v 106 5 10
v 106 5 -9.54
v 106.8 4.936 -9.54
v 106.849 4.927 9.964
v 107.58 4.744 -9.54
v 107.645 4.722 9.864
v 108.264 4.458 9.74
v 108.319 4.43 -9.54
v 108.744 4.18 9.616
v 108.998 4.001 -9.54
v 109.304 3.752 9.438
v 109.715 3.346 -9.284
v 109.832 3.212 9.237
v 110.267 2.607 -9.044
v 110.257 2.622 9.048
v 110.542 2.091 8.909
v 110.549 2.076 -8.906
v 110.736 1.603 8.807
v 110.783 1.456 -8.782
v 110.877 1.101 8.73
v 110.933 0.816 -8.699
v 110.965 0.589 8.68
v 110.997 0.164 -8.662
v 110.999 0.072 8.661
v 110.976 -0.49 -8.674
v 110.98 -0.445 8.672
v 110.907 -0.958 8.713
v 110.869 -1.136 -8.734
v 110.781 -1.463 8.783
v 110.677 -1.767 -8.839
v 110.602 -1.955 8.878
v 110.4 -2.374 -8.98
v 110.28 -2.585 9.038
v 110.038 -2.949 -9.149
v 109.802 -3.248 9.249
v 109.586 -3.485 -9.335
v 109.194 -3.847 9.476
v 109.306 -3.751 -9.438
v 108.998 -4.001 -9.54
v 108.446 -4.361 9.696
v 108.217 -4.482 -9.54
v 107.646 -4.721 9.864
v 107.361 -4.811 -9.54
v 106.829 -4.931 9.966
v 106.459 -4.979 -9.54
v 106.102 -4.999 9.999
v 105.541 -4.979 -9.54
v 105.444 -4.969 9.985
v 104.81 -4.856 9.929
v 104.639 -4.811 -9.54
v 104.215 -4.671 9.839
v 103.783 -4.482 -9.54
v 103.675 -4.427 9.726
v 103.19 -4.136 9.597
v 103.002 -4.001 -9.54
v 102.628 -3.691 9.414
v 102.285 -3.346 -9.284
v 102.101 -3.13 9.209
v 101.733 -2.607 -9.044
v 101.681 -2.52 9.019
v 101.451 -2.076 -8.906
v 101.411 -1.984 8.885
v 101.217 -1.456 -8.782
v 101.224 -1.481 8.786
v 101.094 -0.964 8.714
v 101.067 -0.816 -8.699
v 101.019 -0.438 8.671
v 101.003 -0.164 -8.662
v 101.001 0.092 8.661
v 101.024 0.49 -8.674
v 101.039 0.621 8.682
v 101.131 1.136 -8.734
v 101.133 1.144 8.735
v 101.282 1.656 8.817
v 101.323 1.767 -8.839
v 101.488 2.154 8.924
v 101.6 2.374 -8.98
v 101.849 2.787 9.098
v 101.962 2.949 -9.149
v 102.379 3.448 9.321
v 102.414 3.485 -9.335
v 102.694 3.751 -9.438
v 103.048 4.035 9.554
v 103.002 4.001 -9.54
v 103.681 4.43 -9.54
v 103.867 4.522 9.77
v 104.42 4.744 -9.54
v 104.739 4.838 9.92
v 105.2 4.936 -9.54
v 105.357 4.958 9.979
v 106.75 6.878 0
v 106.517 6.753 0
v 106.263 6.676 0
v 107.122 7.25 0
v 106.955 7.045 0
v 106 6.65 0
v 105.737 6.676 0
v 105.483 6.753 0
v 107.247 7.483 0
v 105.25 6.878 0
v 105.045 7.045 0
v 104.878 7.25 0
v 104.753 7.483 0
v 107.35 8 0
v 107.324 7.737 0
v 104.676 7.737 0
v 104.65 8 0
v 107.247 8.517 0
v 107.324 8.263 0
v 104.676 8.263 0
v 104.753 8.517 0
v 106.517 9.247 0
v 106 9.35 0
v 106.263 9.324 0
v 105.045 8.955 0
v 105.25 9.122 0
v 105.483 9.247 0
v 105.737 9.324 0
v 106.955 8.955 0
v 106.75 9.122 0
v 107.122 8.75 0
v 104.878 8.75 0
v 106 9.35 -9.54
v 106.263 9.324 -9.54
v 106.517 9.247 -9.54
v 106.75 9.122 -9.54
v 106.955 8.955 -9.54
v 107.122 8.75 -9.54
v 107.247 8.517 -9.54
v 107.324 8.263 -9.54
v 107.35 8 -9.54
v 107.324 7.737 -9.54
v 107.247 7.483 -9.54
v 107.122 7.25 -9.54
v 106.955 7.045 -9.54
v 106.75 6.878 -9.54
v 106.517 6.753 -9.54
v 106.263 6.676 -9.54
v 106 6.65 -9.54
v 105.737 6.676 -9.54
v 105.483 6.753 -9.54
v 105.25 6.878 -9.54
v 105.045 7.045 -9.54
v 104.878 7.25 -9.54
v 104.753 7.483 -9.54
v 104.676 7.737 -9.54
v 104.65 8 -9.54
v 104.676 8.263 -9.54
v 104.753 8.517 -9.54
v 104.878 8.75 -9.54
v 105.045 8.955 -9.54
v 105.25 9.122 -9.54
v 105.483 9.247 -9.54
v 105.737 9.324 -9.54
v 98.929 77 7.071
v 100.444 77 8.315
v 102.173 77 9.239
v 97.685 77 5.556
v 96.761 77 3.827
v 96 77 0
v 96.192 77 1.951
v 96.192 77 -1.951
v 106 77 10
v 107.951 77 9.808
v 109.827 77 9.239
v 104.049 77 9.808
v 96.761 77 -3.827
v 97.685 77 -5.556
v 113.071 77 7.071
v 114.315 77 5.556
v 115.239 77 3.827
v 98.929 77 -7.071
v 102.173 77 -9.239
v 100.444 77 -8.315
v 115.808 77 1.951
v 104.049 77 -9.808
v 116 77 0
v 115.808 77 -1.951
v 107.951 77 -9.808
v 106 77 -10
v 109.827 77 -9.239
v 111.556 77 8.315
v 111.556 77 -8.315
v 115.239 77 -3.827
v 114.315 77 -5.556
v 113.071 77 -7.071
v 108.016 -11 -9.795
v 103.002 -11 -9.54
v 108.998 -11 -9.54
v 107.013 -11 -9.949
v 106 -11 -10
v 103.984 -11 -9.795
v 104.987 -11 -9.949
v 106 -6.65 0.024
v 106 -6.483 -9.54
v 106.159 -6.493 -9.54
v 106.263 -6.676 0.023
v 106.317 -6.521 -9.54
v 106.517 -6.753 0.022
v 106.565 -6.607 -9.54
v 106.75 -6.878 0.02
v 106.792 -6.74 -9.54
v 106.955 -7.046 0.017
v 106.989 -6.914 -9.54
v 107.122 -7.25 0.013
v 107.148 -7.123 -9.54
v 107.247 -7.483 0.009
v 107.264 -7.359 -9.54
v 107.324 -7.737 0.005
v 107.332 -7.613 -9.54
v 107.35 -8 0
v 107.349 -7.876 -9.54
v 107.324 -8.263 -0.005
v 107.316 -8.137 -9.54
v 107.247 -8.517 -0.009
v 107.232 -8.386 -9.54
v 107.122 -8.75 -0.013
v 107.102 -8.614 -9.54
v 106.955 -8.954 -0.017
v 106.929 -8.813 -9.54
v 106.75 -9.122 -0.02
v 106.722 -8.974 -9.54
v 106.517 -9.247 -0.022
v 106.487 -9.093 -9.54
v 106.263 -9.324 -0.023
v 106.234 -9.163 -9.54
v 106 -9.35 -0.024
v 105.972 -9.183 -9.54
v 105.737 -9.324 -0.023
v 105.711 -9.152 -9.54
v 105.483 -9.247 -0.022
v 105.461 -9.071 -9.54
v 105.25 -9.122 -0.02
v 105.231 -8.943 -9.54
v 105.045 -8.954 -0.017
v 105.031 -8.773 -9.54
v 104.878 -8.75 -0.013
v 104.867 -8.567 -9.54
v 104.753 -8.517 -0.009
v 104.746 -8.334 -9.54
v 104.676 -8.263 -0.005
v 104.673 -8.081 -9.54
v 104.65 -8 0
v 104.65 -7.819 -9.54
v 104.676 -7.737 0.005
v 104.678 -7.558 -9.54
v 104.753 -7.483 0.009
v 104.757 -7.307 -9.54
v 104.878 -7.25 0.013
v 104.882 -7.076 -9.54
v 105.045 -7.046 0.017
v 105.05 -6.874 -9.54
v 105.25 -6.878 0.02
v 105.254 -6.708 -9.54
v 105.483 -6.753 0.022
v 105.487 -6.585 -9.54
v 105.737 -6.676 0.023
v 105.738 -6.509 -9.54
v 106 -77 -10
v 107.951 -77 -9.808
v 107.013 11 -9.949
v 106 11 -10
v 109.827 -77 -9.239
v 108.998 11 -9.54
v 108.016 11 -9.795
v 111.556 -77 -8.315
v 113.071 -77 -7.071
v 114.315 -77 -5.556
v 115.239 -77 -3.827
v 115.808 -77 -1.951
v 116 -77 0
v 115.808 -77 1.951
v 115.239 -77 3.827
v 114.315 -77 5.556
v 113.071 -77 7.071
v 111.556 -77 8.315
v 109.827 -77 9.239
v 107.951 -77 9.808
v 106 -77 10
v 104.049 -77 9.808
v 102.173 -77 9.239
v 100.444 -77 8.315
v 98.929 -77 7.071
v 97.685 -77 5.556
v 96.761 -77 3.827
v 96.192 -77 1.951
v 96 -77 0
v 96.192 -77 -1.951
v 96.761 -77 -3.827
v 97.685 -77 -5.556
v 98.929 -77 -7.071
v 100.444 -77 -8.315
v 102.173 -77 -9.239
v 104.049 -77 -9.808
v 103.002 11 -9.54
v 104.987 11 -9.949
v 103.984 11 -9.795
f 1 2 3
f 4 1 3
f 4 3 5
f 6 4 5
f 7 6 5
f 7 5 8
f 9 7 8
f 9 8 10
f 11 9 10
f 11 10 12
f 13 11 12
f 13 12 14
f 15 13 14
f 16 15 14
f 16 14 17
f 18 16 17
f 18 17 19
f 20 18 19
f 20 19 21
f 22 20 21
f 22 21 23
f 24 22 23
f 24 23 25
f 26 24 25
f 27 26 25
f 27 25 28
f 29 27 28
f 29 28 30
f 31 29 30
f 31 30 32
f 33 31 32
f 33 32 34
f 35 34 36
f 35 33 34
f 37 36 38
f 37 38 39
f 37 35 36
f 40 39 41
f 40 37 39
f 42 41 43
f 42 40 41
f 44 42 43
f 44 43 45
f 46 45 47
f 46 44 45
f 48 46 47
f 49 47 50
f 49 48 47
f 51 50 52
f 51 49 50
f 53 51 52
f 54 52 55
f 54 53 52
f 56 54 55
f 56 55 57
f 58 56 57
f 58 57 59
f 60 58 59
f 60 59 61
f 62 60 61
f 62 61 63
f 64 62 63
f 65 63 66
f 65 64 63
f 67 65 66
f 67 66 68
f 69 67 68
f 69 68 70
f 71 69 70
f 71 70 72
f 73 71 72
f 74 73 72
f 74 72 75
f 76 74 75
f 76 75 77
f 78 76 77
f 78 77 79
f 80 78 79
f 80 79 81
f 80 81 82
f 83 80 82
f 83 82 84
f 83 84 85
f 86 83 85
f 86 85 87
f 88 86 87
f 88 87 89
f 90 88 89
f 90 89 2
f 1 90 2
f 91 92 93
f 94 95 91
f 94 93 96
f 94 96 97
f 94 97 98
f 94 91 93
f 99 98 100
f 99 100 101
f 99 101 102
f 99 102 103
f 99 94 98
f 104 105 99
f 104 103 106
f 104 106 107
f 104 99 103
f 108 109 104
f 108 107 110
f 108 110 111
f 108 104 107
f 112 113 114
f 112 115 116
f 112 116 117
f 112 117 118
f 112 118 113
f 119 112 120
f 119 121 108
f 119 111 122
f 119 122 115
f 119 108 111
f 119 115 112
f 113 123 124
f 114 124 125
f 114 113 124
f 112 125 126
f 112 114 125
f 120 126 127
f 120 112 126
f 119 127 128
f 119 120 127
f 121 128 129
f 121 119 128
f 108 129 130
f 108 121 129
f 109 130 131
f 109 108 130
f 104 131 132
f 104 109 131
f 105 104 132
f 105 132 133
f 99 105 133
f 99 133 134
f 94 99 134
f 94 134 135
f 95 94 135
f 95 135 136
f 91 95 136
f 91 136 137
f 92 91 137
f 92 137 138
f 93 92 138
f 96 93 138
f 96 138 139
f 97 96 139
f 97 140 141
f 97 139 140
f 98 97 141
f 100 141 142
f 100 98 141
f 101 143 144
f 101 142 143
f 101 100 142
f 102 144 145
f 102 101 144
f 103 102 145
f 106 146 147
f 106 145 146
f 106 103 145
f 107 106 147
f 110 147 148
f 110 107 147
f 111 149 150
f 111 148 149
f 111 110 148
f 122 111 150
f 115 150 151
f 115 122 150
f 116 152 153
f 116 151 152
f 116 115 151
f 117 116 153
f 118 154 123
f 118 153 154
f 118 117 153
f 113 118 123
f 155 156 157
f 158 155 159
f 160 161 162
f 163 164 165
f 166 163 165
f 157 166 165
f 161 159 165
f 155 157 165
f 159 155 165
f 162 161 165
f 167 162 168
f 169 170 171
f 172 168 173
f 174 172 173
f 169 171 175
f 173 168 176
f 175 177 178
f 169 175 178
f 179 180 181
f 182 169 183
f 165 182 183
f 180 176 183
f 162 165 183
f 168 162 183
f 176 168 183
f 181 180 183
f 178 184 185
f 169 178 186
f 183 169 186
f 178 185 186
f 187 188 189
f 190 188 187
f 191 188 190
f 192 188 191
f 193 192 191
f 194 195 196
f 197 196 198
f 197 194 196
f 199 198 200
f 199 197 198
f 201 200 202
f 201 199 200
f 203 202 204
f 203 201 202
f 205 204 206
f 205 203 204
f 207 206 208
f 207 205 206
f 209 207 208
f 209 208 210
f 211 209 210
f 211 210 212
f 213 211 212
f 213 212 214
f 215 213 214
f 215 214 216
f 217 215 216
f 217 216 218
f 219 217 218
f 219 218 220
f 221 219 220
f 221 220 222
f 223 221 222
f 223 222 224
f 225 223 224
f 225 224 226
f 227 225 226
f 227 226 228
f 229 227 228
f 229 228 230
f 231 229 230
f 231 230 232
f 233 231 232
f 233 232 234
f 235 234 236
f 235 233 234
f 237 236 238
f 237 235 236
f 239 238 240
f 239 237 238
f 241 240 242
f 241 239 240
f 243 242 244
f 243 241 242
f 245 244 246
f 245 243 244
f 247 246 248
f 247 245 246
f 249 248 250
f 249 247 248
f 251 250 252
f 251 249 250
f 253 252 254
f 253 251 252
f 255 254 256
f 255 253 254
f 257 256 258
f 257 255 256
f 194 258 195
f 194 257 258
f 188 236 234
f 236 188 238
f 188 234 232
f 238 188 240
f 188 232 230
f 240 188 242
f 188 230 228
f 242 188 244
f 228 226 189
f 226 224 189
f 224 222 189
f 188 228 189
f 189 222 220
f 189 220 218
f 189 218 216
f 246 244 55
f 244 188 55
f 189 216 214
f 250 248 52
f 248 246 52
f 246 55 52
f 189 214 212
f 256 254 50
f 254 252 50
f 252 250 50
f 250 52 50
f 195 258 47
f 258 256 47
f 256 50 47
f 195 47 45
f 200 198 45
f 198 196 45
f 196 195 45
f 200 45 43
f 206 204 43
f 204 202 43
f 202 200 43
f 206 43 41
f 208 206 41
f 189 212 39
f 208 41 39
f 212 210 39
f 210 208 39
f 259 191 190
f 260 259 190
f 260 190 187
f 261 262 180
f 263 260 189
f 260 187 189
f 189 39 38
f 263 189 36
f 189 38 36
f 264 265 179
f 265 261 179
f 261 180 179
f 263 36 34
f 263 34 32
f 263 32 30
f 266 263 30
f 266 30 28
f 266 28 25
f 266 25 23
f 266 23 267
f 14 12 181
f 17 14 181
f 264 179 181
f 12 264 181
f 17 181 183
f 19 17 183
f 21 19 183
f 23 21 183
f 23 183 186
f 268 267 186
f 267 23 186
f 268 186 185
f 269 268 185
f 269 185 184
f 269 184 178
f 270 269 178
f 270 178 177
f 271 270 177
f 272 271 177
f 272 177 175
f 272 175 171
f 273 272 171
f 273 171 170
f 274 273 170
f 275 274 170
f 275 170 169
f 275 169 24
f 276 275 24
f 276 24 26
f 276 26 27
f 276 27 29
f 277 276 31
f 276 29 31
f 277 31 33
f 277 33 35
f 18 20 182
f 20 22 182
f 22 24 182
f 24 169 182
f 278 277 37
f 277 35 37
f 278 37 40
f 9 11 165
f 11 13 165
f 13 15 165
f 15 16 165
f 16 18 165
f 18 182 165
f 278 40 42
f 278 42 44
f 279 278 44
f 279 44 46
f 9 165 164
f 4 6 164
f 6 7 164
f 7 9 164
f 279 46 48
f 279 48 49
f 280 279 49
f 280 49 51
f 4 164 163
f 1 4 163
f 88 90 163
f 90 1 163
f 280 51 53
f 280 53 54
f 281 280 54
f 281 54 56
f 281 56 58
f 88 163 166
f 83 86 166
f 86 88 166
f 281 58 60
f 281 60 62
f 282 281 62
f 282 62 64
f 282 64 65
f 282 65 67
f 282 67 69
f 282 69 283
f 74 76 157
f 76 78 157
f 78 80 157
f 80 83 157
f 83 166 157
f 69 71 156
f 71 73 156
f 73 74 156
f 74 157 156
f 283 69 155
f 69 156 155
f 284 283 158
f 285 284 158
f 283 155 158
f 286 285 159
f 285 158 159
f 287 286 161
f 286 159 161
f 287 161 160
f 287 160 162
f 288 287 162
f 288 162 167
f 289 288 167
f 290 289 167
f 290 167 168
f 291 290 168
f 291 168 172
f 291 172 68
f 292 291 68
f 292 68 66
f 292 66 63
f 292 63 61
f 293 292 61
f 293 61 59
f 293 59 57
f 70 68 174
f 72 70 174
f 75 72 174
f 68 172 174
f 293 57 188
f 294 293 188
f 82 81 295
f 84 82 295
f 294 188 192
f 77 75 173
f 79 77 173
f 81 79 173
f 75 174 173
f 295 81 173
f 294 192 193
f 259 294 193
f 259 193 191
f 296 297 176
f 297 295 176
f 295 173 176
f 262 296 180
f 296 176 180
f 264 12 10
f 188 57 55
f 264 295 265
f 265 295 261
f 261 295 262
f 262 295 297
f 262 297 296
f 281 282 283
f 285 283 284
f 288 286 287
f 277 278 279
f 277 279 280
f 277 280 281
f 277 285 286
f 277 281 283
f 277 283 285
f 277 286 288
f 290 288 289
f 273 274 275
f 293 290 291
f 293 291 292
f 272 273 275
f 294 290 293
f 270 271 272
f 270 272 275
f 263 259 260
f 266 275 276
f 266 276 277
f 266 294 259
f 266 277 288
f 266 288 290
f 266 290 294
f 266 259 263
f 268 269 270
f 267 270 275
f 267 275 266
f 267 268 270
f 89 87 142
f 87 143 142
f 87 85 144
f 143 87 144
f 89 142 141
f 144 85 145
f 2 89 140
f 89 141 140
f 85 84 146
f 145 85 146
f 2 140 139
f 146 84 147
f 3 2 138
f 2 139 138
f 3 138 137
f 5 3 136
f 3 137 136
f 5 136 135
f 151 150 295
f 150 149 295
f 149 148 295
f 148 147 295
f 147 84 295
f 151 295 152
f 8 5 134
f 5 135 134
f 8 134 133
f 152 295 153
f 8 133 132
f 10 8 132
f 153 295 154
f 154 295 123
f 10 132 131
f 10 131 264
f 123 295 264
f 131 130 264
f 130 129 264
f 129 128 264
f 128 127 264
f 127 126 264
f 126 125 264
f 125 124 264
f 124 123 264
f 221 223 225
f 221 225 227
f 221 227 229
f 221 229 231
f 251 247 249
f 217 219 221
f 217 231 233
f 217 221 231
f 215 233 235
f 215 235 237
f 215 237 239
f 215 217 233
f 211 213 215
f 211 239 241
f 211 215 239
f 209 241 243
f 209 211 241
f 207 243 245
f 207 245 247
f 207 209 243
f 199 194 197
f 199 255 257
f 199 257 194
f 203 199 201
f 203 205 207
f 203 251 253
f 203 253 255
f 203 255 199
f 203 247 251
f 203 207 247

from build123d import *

# Parameters (mm, degrees)
CYLINDER004_R               = 1.35
CYLINDER004_DEPTH           = 10
CYLINDER004_PLACEMENT_ANGLE = 91
CYLINDER003_R               = 1.35
CYLINDER003_DEPTH           = 10
CYLINDER003_PITCH_ANGLE     = 90
CYLINDER002_R               = 5
CYLINDER002_DEPTH           = 20
CYLINDER002_PITCH_ANGLE     = 90
BOX_W                       = 10
BOX_H                       = 6
BOX_DEPTH                   = 22
CYLINDER001_R               = 10
CYLINDER001_DEPTH           = 154
CUT003_PITCH_ANGLE          = 90
CUT003_PLACEMENT_ANGLE      = -90


with BuildPart() as cylinder004:
    # Cylinder004 → Cylinder004 (new body)
    with BuildSketch(Plane.XY):
        Circle(CYLINDER004_R)
    extrude(amount=CYLINDER004_DEPTH)


with BuildPart() as cylinder004_1:
    # Cylinder004 placement: moved
    add(cylinder004.part.moved(Location((0, 0, 85))).rotate(Axis((0, 0, 85), (0, 1, 0)), CYLINDER004_PLACEMENT_ANGLE))


with BuildPart() as cylinder003:
    # Cylinder003 → Cylinder003 (new body)
    with BuildSketch(Plane.XY):
        Circle(CYLINDER003_R)
    extrude(amount=CYLINDER003_DEPTH)


with BuildPart() as cylinder003_1:
    # Cylinder003 pitch: moved
    add(cylinder003.part.rotate(Axis((0, 0, 0), (0, 1, 0)), CYLINDER003_PITCH_ANGLE))


with BuildPart() as cylinder003_2:
    # Cylinder003 placement: moved
    add(cylinder003_1.part.moved(Location((0, 0, 69))))


with BuildPart() as cylinder002:
    # Cylinder002 → Cylinder002 (new body)
    with BuildSketch(Plane.XY):
        Circle(CYLINDER002_R)
    extrude(amount=CYLINDER002_DEPTH)


with BuildPart() as cylinder002_1:
    # Cylinder002 pitch: moved
    add(cylinder002.part.rotate(Axis((0, 0, 0), (0, 1, 0)), CYLINDER002_PITCH_ANGLE))


with BuildPart() as cylinder002_2:
    # Cylinder002 placement: moved
    add(cylinder002_1.part.moved(Location((-10, 0, 77))))


with BuildPart() as cube:
    # Box → Box (new body)
    with BuildSketch(Plane(origin=(9.54, -3, 66), x_dir=(1, 0, 0), z_dir=(0, 0, 1))):
        with Locations((5, 3)):
            Rectangle(BOX_W, BOX_H)
    extrude(amount=BOX_DEPTH)


with BuildPart() as lever:
    # Cylinder001 → Cylinder001 (new body)
    with BuildSketch(Plane.XY):
        Circle(CYLINDER001_R)
    extrude(amount=CYLINDER001_DEPTH)

    # Cut: cut Cube
    add(cube.part, mode=Mode.SUBTRACT)

    # Cut001: cut Cylinder002
    add(cylinder002_2.part, mode=Mode.SUBTRACT)

    # Cut002: cut Cylinder003
    add(cylinder003_2.part, mode=Mode.SUBTRACT)

    # Cut003: cut Cylinder004
    add(cylinder004_1.part, mode=Mode.SUBTRACT)


with BuildPart() as lever_1:
    # Cut003 pitch: moved
    add(lever.part.rotate(Axis((0, 0, 0), (0, 1, 0)), CUT003_PITCH_ANGLE))


with BuildPart() as lever_2:
    # Cut003 placement: moved
    add(lever_1.part.moved(Location((106, 77, 0))).rotate(Axis((106, 77, 0), (0, 0, 1)), CUT003_PLACEMENT_ANGLE))


solid = lever_2.part
